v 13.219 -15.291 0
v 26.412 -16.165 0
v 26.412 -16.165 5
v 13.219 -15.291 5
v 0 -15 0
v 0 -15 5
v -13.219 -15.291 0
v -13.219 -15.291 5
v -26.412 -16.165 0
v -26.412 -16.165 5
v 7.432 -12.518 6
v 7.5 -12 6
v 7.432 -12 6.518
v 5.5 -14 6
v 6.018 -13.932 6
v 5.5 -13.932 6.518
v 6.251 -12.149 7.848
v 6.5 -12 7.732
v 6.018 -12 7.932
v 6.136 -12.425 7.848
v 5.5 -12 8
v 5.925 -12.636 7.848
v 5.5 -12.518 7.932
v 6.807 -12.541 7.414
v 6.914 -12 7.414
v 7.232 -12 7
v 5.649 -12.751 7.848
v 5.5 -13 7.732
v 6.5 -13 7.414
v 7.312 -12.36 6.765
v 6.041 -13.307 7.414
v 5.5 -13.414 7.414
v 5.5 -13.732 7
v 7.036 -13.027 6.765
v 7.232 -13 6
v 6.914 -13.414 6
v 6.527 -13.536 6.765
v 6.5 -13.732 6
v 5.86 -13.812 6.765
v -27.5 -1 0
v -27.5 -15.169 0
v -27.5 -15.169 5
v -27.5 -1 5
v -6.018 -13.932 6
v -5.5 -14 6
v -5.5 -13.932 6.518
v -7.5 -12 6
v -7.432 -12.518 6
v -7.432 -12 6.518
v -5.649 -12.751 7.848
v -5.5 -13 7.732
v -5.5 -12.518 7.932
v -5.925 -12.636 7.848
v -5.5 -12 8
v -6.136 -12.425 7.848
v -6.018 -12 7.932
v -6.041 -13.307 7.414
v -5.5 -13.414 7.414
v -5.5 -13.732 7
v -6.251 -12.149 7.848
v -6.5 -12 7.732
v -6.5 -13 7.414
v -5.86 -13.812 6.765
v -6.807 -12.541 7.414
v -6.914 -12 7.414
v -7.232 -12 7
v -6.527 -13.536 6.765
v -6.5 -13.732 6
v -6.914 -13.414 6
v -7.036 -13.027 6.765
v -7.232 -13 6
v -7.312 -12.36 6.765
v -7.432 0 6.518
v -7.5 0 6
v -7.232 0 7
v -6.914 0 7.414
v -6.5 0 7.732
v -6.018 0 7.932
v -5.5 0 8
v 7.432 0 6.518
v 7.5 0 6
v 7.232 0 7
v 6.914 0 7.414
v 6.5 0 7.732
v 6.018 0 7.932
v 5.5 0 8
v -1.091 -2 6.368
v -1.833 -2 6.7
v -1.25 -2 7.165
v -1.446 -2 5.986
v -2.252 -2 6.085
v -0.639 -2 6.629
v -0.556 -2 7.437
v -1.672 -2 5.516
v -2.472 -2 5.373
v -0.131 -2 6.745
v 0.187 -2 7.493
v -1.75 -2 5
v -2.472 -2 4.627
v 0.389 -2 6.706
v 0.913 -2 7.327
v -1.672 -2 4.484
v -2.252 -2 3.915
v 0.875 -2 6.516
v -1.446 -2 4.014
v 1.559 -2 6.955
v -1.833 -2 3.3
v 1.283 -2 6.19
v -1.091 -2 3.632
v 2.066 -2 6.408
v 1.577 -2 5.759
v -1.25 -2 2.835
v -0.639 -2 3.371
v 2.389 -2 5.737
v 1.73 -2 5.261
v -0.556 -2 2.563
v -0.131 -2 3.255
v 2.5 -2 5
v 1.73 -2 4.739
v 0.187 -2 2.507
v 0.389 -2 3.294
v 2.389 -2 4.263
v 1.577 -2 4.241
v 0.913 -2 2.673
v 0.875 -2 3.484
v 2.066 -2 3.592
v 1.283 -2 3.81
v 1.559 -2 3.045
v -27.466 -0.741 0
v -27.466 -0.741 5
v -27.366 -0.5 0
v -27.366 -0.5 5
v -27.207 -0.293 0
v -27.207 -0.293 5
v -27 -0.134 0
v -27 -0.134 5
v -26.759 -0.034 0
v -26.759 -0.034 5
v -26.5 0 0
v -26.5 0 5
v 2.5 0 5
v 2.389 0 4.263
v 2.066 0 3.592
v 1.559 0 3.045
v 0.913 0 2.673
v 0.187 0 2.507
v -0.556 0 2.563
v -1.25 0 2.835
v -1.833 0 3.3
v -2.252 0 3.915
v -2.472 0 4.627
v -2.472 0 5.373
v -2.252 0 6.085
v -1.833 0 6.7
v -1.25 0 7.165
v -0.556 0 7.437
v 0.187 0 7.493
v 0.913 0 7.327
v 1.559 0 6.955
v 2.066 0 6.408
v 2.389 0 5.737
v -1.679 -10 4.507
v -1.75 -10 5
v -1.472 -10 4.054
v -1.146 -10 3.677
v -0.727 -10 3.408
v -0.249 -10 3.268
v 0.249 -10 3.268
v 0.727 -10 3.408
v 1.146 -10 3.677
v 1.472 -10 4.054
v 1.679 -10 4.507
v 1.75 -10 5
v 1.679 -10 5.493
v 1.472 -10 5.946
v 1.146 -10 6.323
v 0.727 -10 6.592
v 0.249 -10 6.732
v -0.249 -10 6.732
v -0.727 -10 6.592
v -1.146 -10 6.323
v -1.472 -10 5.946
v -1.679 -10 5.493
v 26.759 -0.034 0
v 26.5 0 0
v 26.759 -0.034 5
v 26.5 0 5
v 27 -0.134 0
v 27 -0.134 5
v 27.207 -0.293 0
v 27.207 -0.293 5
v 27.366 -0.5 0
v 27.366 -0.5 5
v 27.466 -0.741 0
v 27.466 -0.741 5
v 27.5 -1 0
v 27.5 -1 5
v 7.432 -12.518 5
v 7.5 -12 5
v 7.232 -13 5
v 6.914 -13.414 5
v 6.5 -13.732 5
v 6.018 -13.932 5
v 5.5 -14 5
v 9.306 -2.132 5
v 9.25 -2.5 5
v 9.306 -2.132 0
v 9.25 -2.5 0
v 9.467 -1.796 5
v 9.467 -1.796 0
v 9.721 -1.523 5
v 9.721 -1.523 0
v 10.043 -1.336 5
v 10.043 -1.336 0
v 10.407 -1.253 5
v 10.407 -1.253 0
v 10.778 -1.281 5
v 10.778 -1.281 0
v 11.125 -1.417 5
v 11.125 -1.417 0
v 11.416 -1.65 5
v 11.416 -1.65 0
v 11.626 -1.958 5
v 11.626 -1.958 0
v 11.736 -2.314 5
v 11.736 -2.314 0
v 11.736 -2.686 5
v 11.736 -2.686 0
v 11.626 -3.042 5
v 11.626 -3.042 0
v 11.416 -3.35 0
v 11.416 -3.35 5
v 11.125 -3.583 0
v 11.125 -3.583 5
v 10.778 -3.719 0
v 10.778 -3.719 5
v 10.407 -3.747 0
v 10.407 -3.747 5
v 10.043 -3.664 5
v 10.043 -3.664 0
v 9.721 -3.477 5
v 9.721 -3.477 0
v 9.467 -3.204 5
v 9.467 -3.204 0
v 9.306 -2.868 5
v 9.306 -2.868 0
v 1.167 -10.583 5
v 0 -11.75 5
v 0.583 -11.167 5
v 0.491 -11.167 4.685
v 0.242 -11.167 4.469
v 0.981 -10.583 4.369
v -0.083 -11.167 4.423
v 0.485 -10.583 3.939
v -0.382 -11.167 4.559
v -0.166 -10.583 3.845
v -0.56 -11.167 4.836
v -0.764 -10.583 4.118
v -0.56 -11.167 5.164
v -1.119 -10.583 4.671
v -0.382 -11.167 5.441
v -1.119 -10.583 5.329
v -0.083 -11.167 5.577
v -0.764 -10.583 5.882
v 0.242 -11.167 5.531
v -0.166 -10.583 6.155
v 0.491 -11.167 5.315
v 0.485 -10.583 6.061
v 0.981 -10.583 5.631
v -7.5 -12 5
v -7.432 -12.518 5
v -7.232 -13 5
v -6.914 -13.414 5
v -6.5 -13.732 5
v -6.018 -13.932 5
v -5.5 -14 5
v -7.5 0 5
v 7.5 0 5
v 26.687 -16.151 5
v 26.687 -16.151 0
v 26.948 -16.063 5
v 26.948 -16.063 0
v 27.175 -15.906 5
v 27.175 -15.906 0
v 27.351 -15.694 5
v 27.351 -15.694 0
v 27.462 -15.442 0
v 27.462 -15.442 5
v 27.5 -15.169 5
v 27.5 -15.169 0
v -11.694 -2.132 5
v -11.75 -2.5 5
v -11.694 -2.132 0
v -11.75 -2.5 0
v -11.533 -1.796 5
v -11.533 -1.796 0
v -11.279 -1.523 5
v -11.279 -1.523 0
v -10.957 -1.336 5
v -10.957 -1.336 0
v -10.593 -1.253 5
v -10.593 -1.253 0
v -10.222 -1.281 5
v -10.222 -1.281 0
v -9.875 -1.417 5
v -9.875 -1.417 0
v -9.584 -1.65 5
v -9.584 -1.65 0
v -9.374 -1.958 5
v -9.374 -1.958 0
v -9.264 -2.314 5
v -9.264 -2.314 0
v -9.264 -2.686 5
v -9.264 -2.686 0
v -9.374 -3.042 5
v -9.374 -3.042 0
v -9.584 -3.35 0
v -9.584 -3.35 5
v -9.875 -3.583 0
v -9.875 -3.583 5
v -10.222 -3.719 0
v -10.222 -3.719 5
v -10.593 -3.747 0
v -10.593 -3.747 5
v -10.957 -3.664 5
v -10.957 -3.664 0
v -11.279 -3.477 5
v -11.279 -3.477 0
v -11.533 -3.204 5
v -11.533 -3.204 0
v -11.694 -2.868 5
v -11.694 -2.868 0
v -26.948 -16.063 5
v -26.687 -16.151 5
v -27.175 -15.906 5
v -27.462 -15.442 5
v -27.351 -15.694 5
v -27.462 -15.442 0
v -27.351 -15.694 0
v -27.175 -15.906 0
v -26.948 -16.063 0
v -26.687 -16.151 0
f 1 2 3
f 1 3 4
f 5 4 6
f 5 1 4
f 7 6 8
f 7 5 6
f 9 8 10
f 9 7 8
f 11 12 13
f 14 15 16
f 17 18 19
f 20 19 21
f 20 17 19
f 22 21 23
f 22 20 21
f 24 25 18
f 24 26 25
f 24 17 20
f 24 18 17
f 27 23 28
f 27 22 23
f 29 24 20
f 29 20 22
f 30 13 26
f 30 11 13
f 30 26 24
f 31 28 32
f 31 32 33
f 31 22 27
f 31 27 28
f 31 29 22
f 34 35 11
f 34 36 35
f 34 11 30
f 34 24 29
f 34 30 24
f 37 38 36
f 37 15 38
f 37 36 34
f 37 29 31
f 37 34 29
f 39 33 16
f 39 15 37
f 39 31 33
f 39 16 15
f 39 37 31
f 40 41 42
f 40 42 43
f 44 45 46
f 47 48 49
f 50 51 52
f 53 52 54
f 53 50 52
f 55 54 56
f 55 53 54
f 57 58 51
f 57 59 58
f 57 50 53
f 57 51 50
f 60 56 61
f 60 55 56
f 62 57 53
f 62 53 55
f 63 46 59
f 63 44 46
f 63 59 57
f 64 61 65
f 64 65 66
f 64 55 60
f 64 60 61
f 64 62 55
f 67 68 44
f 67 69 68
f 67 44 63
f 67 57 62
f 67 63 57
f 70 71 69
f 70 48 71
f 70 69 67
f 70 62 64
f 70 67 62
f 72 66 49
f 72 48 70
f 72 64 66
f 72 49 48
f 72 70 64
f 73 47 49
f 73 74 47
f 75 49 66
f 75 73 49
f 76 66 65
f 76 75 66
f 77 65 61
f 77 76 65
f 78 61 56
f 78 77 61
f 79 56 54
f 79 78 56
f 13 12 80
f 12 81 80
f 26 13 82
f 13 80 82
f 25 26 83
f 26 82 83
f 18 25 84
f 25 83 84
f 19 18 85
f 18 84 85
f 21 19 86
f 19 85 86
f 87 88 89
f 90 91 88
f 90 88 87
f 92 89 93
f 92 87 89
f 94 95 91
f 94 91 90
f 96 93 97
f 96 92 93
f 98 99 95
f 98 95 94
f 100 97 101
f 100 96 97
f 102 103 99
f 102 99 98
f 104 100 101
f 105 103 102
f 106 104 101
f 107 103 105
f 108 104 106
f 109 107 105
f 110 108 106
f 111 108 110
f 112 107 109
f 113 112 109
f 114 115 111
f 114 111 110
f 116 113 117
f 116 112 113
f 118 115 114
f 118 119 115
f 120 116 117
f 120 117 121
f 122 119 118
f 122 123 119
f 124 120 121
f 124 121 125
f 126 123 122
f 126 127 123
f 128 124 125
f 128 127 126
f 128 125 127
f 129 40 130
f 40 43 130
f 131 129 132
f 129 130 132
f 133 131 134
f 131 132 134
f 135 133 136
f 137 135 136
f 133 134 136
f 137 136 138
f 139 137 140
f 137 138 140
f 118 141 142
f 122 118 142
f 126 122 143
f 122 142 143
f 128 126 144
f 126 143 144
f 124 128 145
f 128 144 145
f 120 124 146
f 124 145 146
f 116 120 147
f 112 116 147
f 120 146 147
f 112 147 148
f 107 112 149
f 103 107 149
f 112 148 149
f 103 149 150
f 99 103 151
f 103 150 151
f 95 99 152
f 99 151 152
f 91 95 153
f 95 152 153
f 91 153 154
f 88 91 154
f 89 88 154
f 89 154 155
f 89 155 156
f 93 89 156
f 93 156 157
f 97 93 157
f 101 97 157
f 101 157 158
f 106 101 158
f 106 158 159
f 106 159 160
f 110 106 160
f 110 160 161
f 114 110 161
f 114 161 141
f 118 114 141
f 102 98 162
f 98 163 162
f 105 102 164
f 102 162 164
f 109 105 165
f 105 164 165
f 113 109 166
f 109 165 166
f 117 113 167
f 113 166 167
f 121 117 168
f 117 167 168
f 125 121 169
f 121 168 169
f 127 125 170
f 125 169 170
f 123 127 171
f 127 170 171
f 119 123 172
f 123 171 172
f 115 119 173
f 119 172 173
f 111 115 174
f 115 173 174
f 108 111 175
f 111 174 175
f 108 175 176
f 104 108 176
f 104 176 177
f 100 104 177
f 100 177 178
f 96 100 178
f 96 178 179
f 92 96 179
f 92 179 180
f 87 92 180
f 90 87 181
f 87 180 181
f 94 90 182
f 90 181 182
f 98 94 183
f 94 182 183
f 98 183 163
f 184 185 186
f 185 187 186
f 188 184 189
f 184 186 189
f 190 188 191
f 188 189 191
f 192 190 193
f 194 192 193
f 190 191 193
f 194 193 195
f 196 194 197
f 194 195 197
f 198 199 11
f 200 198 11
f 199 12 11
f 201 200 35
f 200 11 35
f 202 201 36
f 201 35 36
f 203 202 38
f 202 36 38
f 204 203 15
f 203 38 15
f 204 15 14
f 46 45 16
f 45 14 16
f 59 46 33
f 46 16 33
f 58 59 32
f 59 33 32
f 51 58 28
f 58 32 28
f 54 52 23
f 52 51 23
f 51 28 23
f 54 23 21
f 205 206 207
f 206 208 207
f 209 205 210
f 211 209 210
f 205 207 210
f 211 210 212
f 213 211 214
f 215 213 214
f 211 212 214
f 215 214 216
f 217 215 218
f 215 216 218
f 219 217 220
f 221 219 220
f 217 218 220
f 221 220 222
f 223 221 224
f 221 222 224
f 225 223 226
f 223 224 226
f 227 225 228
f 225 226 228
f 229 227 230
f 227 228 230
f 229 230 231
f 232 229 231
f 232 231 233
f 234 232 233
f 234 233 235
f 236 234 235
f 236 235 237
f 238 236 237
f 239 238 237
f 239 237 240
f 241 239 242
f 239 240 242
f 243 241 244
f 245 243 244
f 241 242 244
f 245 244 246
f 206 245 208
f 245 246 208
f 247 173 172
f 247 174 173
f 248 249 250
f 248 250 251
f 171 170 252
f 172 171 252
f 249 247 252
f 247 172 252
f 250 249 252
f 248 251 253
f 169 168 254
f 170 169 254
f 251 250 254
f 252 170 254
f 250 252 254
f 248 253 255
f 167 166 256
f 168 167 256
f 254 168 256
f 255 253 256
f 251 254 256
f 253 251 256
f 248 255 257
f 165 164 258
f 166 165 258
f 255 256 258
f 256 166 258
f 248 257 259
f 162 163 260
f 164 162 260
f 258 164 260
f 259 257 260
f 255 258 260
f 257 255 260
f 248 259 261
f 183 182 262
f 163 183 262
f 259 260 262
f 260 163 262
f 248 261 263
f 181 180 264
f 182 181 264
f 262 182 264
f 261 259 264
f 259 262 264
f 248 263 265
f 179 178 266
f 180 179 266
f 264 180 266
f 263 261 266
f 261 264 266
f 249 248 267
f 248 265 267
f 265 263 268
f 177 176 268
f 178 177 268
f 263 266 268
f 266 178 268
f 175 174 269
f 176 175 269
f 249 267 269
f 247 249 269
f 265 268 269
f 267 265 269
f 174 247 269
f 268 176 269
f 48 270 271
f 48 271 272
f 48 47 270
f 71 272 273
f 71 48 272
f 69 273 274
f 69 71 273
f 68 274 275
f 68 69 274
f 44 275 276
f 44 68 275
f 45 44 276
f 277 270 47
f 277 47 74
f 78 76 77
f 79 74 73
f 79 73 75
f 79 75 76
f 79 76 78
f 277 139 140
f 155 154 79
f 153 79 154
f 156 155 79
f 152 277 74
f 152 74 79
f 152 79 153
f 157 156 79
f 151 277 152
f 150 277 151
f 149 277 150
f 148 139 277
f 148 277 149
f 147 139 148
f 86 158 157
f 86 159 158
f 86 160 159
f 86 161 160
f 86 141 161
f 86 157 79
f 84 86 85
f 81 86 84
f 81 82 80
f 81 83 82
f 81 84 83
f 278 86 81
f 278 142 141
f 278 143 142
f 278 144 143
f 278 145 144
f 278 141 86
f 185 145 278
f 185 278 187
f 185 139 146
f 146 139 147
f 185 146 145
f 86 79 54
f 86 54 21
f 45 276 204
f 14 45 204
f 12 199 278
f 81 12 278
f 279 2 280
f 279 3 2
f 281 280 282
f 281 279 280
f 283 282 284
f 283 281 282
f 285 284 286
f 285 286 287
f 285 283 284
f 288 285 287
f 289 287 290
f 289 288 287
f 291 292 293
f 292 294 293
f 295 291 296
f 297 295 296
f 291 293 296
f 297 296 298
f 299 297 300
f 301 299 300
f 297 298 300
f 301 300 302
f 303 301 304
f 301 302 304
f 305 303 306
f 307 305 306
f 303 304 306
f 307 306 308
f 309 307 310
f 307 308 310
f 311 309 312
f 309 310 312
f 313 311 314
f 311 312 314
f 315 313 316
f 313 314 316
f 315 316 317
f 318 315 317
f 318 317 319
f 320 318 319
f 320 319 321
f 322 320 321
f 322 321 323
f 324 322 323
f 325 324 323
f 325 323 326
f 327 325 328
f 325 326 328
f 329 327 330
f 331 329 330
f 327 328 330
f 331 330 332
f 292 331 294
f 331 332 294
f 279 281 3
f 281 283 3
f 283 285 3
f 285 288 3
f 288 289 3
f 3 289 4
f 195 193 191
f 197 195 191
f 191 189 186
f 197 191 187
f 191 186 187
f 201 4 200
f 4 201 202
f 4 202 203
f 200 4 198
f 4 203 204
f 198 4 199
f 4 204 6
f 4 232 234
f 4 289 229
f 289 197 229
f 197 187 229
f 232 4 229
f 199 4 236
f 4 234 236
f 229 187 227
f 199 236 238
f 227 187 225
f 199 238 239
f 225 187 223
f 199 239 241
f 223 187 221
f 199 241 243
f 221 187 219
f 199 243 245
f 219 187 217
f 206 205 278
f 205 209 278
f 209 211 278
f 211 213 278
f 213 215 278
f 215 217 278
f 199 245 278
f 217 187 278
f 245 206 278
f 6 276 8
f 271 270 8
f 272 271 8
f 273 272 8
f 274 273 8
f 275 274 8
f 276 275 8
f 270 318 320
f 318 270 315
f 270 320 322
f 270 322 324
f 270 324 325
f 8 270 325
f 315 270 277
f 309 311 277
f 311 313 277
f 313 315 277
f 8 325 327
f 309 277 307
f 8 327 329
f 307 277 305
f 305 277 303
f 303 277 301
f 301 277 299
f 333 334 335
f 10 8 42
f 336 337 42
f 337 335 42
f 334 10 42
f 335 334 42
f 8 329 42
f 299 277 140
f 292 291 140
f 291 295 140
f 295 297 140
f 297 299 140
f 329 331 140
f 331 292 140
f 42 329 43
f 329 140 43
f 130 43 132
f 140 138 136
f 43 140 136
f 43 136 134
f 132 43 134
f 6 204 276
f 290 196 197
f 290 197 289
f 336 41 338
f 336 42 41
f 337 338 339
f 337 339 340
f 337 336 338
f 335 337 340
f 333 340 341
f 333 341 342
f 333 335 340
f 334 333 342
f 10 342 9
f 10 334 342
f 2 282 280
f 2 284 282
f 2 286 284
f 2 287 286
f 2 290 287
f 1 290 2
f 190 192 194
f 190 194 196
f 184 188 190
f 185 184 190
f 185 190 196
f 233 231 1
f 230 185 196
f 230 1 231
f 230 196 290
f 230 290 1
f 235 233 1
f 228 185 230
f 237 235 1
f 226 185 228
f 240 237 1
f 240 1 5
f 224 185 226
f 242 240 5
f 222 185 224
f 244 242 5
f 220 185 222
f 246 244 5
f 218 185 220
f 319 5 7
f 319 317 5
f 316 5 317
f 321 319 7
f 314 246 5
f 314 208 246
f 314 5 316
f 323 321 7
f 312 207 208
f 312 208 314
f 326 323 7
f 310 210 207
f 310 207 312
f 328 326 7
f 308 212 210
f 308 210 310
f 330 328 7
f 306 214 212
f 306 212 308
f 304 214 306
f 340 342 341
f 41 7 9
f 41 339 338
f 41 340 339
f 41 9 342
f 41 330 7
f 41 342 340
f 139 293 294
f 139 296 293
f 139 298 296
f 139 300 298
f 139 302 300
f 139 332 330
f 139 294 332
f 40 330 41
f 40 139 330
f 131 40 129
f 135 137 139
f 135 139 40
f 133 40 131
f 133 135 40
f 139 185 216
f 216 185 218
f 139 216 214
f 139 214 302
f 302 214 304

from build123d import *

# Parameters (mm, degrees)
BOSS_EXTRUDE1_DEPTH                     = 5
SKETCH4_W                               = 15
SKETCH4_H                               = 14
BOSS_EXTRUDE2_DEPTH                     = 3
CBORE_FOR_M6_HEX_HEAD_BOLT1_D           = 3.5
CBORE_FOR_M6_HEX_HEAD_BOLT1_DEPTH       = 10
CBORE_FOR_M6_HEX_HEAD_BOLT1_CBORE_D     = 5
CBORE_FOR_M6_HEX_HEAD_BOLT1_CBORE_DEPTH = 2
CBORE_FOR_M6_HEX_HEAD_BOLT1_TIP         = 1.75
FILLET1_R                               = 1
FILLET2_R                               = 2
M3X0_5_TAPPED_HOLE1_D                   = 2.5
M3X0_5_TAPPED_HOLE1_DEPTH               = 5
M3X0_5_TAPPED_HOLE1_TIP                 = 0.751075774


with BuildPart() as part:
    # Sketch1 → Boss-Extrude1 (new body)
    with BuildSketch(Plane(origin=(0, 0, 0), x_dir=(-1, 0, 0), z_dir=(0, 0, -1))):
        with BuildLine():
            Line((27.500000074, -16.263075607), (27.500000074, 0))
            Line((27.500000074, 0), (-27.5, 0))
            Line((-27.5, 0), (-27.5, -16.2630756))
            ThreePointArc((-27.5, -16.2630756), (3.7e-08, -15), (27.500000074, -16.263075607))
        make_face()
    extrude(amount=-BOSS_EXTRUDE1_DEPTH)

    # Sketch4 → Boss-Extrude2 (add)
    with BuildSketch(Plane.XY.offset(5)):
        with Locations((0, -7)):
            Rectangle(SKETCH4_W, SKETCH4_H)
    extrude(amount=BOSS_EXTRUDE2_DEPTH)

    # CBORE for M6 Hex Head Bolt1
    with Locations(Plane(origin=(0, 0, 0), x_dir=(1, 0, 0), z_dir=(0, 1, 0))):
        with Locations((0, -5)):
            CounterBoreHole(CBORE_FOR_M6_HEX_HEAD_BOLT1_D / 2, CBORE_FOR_M6_HEX_HEAD_BOLT1_CBORE_D / 2, CBORE_FOR_M6_HEX_HEAD_BOLT1_CBORE_DEPTH, depth=CBORE_FOR_M6_HEX_HEAD_BOLT1_DEPTH)
            with Locations((0, 0, -(CBORE_FOR_M6_HEX_HEAD_BOLT1_DEPTH + CBORE_FOR_M6_HEX_HEAD_BOLT1_TIP / 2))):  # 90° drill point
                Cone(0, CBORE_FOR_M6_HEX_HEAD_BOLT1_D / 2, CBORE_FOR_M6_HEX_HEAD_BOLT1_TIP, mode=Mode.SUBTRACT)

    # Fillet1
    fillet1_edges = [part.edges().sort_by_distance(p)[0] for p in [
        (27.5, 0, 2.5),
        (-27.500000074, 0, 2.5),
        (27.5, -16.2630756, 2.5),
        (-27.500000074, -16.263075607, 2.5),
    ]]
    fillet(fillet1_edges, radius=FILLET1_R)

    # Fillet2
    fillet2_edges = [part.edges().sort_by_distance(p)[0] for p in [
        (7.5, -14, 6.5),
        (7.5, -7, 8),
        (-7.5, -14, 6.5),
        (0, -14, 8),
        (-7.5, -7, 8),
    ]]
    fillet(fillet2_edges, radius=FILLET2_R)

    # M3x0.5 Tapped Hole1
    with Locations(Plane(origin=(-10.5, -2.5, 5), x_dir=(1, 0, 0), z_dir=(0, 0, 1))):
        with Locations((0, 0), (21, 0)):
            Hole(M3X0_5_TAPPED_HOLE1_D / 2, depth=M3X0_5_TAPPED_HOLE1_DEPTH)
            with Locations((0, 0, -(M3X0_5_TAPPED_HOLE1_DEPTH + M3X0_5_TAPPED_HOLE1_TIP / 2))):  # 118° drill point
                Cone(0, M3X0_5_TAPPED_HOLE1_D / 2, M3X0_5_TAPPED_HOLE1_TIP, mode=Mode.SUBTRACT)


solid = part.part
